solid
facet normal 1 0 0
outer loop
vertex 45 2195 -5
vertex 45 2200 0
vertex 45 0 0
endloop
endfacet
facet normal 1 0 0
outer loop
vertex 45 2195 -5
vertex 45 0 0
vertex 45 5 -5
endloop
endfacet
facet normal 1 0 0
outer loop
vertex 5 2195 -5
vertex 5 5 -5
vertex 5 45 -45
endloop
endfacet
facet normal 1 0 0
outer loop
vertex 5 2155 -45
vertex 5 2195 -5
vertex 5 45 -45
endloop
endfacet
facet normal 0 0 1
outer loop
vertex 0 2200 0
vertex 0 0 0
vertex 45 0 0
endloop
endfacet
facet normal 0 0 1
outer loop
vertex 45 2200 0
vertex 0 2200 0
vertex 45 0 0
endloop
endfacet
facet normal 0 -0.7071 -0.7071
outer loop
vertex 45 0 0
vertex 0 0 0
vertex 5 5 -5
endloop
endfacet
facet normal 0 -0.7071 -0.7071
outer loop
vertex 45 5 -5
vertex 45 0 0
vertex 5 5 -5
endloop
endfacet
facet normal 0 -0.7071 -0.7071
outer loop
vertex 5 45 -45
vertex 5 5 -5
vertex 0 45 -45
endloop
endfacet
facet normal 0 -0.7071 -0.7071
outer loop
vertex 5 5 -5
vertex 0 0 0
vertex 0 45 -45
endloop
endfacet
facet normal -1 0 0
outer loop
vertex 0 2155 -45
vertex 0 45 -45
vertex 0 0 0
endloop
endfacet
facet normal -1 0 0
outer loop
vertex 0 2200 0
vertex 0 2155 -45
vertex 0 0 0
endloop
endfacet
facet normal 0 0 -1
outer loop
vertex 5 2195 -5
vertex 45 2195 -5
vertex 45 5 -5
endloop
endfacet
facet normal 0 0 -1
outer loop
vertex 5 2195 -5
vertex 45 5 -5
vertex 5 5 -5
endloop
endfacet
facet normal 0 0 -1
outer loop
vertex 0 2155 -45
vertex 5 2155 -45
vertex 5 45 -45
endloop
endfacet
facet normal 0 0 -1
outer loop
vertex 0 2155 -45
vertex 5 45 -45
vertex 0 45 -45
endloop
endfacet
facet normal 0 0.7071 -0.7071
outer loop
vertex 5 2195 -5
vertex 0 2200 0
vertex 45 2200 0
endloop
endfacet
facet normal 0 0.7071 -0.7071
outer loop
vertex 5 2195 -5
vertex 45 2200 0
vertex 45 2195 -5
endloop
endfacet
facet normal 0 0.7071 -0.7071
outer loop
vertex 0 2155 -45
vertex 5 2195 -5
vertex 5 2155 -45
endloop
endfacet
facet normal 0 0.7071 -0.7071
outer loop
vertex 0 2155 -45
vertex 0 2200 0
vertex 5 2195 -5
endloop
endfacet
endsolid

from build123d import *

# Parameters (mm, degrees)
EXTRUDE_1_DEPTH     = 2200
CUT_EXTRUDE_1_DEPTH = 46


with BuildPart() as part:
    # Эскиз1 → Вытянуть-Тонкостенный1 (new body)
    with BuildSketch(Plane(origin=(0, 0, 0), x_dir=(1, 0, 0), z_dir=(0, 1, 0))):
        Polygon((0, 45), (0, 0), (45, 0), (45, 5), (5, 5), (5, 45), align=None)
    extrude(amount=EXTRUDE_1_DEPTH)

    # Эскиз2 → Вырез-Вытянуть1 (cut, through all)
    with BuildSketch(Plane.ZY):
        Polygon((0, 0), (-45, 45), (-45, 0), align=None)
        Polygon((-45, 2200), (0, 2200), (-45, 2155), align=None)
    extrude(amount=-CUT_EXTRUDE_1_DEPTH, mode=Mode.SUBTRACT)


solid = part.part
